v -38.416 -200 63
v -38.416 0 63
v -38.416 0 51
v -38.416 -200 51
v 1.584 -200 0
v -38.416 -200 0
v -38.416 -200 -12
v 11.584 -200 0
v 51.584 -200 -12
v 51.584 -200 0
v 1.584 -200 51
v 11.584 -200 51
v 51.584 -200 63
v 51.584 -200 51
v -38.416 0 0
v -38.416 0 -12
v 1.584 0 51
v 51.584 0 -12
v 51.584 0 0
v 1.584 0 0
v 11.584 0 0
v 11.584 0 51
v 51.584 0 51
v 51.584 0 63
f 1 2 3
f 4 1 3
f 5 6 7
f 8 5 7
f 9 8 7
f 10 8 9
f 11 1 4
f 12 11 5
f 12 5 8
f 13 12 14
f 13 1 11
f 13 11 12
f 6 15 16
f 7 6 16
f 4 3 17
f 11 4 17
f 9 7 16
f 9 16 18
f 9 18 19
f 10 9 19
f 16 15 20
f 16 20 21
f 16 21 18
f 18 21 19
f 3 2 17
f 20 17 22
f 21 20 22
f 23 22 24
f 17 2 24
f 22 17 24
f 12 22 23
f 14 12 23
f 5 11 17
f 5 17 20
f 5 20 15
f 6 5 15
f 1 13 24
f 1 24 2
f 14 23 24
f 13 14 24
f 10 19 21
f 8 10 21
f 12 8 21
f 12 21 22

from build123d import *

# Parameters (mm, degrees)
PAD_DEPTH = 200


with BuildPart() as part:
    # Sketch → Pad (new body)
    with BuildSketch(Plane.XZ):
        Polygon((-38.415913, 63), (-38.415913, 51), (1.584087, 51), (1.584087, 0), (-38.415913, 0), (-38.415913, -12), (51.584087, -12), (51.584087, 0), (11.584087, 0), (11.584087, 51), (51.584087, 51), (51.584087, 63), align=None)
    extrude(amount=PAD_DEPTH)


solid = part.part
